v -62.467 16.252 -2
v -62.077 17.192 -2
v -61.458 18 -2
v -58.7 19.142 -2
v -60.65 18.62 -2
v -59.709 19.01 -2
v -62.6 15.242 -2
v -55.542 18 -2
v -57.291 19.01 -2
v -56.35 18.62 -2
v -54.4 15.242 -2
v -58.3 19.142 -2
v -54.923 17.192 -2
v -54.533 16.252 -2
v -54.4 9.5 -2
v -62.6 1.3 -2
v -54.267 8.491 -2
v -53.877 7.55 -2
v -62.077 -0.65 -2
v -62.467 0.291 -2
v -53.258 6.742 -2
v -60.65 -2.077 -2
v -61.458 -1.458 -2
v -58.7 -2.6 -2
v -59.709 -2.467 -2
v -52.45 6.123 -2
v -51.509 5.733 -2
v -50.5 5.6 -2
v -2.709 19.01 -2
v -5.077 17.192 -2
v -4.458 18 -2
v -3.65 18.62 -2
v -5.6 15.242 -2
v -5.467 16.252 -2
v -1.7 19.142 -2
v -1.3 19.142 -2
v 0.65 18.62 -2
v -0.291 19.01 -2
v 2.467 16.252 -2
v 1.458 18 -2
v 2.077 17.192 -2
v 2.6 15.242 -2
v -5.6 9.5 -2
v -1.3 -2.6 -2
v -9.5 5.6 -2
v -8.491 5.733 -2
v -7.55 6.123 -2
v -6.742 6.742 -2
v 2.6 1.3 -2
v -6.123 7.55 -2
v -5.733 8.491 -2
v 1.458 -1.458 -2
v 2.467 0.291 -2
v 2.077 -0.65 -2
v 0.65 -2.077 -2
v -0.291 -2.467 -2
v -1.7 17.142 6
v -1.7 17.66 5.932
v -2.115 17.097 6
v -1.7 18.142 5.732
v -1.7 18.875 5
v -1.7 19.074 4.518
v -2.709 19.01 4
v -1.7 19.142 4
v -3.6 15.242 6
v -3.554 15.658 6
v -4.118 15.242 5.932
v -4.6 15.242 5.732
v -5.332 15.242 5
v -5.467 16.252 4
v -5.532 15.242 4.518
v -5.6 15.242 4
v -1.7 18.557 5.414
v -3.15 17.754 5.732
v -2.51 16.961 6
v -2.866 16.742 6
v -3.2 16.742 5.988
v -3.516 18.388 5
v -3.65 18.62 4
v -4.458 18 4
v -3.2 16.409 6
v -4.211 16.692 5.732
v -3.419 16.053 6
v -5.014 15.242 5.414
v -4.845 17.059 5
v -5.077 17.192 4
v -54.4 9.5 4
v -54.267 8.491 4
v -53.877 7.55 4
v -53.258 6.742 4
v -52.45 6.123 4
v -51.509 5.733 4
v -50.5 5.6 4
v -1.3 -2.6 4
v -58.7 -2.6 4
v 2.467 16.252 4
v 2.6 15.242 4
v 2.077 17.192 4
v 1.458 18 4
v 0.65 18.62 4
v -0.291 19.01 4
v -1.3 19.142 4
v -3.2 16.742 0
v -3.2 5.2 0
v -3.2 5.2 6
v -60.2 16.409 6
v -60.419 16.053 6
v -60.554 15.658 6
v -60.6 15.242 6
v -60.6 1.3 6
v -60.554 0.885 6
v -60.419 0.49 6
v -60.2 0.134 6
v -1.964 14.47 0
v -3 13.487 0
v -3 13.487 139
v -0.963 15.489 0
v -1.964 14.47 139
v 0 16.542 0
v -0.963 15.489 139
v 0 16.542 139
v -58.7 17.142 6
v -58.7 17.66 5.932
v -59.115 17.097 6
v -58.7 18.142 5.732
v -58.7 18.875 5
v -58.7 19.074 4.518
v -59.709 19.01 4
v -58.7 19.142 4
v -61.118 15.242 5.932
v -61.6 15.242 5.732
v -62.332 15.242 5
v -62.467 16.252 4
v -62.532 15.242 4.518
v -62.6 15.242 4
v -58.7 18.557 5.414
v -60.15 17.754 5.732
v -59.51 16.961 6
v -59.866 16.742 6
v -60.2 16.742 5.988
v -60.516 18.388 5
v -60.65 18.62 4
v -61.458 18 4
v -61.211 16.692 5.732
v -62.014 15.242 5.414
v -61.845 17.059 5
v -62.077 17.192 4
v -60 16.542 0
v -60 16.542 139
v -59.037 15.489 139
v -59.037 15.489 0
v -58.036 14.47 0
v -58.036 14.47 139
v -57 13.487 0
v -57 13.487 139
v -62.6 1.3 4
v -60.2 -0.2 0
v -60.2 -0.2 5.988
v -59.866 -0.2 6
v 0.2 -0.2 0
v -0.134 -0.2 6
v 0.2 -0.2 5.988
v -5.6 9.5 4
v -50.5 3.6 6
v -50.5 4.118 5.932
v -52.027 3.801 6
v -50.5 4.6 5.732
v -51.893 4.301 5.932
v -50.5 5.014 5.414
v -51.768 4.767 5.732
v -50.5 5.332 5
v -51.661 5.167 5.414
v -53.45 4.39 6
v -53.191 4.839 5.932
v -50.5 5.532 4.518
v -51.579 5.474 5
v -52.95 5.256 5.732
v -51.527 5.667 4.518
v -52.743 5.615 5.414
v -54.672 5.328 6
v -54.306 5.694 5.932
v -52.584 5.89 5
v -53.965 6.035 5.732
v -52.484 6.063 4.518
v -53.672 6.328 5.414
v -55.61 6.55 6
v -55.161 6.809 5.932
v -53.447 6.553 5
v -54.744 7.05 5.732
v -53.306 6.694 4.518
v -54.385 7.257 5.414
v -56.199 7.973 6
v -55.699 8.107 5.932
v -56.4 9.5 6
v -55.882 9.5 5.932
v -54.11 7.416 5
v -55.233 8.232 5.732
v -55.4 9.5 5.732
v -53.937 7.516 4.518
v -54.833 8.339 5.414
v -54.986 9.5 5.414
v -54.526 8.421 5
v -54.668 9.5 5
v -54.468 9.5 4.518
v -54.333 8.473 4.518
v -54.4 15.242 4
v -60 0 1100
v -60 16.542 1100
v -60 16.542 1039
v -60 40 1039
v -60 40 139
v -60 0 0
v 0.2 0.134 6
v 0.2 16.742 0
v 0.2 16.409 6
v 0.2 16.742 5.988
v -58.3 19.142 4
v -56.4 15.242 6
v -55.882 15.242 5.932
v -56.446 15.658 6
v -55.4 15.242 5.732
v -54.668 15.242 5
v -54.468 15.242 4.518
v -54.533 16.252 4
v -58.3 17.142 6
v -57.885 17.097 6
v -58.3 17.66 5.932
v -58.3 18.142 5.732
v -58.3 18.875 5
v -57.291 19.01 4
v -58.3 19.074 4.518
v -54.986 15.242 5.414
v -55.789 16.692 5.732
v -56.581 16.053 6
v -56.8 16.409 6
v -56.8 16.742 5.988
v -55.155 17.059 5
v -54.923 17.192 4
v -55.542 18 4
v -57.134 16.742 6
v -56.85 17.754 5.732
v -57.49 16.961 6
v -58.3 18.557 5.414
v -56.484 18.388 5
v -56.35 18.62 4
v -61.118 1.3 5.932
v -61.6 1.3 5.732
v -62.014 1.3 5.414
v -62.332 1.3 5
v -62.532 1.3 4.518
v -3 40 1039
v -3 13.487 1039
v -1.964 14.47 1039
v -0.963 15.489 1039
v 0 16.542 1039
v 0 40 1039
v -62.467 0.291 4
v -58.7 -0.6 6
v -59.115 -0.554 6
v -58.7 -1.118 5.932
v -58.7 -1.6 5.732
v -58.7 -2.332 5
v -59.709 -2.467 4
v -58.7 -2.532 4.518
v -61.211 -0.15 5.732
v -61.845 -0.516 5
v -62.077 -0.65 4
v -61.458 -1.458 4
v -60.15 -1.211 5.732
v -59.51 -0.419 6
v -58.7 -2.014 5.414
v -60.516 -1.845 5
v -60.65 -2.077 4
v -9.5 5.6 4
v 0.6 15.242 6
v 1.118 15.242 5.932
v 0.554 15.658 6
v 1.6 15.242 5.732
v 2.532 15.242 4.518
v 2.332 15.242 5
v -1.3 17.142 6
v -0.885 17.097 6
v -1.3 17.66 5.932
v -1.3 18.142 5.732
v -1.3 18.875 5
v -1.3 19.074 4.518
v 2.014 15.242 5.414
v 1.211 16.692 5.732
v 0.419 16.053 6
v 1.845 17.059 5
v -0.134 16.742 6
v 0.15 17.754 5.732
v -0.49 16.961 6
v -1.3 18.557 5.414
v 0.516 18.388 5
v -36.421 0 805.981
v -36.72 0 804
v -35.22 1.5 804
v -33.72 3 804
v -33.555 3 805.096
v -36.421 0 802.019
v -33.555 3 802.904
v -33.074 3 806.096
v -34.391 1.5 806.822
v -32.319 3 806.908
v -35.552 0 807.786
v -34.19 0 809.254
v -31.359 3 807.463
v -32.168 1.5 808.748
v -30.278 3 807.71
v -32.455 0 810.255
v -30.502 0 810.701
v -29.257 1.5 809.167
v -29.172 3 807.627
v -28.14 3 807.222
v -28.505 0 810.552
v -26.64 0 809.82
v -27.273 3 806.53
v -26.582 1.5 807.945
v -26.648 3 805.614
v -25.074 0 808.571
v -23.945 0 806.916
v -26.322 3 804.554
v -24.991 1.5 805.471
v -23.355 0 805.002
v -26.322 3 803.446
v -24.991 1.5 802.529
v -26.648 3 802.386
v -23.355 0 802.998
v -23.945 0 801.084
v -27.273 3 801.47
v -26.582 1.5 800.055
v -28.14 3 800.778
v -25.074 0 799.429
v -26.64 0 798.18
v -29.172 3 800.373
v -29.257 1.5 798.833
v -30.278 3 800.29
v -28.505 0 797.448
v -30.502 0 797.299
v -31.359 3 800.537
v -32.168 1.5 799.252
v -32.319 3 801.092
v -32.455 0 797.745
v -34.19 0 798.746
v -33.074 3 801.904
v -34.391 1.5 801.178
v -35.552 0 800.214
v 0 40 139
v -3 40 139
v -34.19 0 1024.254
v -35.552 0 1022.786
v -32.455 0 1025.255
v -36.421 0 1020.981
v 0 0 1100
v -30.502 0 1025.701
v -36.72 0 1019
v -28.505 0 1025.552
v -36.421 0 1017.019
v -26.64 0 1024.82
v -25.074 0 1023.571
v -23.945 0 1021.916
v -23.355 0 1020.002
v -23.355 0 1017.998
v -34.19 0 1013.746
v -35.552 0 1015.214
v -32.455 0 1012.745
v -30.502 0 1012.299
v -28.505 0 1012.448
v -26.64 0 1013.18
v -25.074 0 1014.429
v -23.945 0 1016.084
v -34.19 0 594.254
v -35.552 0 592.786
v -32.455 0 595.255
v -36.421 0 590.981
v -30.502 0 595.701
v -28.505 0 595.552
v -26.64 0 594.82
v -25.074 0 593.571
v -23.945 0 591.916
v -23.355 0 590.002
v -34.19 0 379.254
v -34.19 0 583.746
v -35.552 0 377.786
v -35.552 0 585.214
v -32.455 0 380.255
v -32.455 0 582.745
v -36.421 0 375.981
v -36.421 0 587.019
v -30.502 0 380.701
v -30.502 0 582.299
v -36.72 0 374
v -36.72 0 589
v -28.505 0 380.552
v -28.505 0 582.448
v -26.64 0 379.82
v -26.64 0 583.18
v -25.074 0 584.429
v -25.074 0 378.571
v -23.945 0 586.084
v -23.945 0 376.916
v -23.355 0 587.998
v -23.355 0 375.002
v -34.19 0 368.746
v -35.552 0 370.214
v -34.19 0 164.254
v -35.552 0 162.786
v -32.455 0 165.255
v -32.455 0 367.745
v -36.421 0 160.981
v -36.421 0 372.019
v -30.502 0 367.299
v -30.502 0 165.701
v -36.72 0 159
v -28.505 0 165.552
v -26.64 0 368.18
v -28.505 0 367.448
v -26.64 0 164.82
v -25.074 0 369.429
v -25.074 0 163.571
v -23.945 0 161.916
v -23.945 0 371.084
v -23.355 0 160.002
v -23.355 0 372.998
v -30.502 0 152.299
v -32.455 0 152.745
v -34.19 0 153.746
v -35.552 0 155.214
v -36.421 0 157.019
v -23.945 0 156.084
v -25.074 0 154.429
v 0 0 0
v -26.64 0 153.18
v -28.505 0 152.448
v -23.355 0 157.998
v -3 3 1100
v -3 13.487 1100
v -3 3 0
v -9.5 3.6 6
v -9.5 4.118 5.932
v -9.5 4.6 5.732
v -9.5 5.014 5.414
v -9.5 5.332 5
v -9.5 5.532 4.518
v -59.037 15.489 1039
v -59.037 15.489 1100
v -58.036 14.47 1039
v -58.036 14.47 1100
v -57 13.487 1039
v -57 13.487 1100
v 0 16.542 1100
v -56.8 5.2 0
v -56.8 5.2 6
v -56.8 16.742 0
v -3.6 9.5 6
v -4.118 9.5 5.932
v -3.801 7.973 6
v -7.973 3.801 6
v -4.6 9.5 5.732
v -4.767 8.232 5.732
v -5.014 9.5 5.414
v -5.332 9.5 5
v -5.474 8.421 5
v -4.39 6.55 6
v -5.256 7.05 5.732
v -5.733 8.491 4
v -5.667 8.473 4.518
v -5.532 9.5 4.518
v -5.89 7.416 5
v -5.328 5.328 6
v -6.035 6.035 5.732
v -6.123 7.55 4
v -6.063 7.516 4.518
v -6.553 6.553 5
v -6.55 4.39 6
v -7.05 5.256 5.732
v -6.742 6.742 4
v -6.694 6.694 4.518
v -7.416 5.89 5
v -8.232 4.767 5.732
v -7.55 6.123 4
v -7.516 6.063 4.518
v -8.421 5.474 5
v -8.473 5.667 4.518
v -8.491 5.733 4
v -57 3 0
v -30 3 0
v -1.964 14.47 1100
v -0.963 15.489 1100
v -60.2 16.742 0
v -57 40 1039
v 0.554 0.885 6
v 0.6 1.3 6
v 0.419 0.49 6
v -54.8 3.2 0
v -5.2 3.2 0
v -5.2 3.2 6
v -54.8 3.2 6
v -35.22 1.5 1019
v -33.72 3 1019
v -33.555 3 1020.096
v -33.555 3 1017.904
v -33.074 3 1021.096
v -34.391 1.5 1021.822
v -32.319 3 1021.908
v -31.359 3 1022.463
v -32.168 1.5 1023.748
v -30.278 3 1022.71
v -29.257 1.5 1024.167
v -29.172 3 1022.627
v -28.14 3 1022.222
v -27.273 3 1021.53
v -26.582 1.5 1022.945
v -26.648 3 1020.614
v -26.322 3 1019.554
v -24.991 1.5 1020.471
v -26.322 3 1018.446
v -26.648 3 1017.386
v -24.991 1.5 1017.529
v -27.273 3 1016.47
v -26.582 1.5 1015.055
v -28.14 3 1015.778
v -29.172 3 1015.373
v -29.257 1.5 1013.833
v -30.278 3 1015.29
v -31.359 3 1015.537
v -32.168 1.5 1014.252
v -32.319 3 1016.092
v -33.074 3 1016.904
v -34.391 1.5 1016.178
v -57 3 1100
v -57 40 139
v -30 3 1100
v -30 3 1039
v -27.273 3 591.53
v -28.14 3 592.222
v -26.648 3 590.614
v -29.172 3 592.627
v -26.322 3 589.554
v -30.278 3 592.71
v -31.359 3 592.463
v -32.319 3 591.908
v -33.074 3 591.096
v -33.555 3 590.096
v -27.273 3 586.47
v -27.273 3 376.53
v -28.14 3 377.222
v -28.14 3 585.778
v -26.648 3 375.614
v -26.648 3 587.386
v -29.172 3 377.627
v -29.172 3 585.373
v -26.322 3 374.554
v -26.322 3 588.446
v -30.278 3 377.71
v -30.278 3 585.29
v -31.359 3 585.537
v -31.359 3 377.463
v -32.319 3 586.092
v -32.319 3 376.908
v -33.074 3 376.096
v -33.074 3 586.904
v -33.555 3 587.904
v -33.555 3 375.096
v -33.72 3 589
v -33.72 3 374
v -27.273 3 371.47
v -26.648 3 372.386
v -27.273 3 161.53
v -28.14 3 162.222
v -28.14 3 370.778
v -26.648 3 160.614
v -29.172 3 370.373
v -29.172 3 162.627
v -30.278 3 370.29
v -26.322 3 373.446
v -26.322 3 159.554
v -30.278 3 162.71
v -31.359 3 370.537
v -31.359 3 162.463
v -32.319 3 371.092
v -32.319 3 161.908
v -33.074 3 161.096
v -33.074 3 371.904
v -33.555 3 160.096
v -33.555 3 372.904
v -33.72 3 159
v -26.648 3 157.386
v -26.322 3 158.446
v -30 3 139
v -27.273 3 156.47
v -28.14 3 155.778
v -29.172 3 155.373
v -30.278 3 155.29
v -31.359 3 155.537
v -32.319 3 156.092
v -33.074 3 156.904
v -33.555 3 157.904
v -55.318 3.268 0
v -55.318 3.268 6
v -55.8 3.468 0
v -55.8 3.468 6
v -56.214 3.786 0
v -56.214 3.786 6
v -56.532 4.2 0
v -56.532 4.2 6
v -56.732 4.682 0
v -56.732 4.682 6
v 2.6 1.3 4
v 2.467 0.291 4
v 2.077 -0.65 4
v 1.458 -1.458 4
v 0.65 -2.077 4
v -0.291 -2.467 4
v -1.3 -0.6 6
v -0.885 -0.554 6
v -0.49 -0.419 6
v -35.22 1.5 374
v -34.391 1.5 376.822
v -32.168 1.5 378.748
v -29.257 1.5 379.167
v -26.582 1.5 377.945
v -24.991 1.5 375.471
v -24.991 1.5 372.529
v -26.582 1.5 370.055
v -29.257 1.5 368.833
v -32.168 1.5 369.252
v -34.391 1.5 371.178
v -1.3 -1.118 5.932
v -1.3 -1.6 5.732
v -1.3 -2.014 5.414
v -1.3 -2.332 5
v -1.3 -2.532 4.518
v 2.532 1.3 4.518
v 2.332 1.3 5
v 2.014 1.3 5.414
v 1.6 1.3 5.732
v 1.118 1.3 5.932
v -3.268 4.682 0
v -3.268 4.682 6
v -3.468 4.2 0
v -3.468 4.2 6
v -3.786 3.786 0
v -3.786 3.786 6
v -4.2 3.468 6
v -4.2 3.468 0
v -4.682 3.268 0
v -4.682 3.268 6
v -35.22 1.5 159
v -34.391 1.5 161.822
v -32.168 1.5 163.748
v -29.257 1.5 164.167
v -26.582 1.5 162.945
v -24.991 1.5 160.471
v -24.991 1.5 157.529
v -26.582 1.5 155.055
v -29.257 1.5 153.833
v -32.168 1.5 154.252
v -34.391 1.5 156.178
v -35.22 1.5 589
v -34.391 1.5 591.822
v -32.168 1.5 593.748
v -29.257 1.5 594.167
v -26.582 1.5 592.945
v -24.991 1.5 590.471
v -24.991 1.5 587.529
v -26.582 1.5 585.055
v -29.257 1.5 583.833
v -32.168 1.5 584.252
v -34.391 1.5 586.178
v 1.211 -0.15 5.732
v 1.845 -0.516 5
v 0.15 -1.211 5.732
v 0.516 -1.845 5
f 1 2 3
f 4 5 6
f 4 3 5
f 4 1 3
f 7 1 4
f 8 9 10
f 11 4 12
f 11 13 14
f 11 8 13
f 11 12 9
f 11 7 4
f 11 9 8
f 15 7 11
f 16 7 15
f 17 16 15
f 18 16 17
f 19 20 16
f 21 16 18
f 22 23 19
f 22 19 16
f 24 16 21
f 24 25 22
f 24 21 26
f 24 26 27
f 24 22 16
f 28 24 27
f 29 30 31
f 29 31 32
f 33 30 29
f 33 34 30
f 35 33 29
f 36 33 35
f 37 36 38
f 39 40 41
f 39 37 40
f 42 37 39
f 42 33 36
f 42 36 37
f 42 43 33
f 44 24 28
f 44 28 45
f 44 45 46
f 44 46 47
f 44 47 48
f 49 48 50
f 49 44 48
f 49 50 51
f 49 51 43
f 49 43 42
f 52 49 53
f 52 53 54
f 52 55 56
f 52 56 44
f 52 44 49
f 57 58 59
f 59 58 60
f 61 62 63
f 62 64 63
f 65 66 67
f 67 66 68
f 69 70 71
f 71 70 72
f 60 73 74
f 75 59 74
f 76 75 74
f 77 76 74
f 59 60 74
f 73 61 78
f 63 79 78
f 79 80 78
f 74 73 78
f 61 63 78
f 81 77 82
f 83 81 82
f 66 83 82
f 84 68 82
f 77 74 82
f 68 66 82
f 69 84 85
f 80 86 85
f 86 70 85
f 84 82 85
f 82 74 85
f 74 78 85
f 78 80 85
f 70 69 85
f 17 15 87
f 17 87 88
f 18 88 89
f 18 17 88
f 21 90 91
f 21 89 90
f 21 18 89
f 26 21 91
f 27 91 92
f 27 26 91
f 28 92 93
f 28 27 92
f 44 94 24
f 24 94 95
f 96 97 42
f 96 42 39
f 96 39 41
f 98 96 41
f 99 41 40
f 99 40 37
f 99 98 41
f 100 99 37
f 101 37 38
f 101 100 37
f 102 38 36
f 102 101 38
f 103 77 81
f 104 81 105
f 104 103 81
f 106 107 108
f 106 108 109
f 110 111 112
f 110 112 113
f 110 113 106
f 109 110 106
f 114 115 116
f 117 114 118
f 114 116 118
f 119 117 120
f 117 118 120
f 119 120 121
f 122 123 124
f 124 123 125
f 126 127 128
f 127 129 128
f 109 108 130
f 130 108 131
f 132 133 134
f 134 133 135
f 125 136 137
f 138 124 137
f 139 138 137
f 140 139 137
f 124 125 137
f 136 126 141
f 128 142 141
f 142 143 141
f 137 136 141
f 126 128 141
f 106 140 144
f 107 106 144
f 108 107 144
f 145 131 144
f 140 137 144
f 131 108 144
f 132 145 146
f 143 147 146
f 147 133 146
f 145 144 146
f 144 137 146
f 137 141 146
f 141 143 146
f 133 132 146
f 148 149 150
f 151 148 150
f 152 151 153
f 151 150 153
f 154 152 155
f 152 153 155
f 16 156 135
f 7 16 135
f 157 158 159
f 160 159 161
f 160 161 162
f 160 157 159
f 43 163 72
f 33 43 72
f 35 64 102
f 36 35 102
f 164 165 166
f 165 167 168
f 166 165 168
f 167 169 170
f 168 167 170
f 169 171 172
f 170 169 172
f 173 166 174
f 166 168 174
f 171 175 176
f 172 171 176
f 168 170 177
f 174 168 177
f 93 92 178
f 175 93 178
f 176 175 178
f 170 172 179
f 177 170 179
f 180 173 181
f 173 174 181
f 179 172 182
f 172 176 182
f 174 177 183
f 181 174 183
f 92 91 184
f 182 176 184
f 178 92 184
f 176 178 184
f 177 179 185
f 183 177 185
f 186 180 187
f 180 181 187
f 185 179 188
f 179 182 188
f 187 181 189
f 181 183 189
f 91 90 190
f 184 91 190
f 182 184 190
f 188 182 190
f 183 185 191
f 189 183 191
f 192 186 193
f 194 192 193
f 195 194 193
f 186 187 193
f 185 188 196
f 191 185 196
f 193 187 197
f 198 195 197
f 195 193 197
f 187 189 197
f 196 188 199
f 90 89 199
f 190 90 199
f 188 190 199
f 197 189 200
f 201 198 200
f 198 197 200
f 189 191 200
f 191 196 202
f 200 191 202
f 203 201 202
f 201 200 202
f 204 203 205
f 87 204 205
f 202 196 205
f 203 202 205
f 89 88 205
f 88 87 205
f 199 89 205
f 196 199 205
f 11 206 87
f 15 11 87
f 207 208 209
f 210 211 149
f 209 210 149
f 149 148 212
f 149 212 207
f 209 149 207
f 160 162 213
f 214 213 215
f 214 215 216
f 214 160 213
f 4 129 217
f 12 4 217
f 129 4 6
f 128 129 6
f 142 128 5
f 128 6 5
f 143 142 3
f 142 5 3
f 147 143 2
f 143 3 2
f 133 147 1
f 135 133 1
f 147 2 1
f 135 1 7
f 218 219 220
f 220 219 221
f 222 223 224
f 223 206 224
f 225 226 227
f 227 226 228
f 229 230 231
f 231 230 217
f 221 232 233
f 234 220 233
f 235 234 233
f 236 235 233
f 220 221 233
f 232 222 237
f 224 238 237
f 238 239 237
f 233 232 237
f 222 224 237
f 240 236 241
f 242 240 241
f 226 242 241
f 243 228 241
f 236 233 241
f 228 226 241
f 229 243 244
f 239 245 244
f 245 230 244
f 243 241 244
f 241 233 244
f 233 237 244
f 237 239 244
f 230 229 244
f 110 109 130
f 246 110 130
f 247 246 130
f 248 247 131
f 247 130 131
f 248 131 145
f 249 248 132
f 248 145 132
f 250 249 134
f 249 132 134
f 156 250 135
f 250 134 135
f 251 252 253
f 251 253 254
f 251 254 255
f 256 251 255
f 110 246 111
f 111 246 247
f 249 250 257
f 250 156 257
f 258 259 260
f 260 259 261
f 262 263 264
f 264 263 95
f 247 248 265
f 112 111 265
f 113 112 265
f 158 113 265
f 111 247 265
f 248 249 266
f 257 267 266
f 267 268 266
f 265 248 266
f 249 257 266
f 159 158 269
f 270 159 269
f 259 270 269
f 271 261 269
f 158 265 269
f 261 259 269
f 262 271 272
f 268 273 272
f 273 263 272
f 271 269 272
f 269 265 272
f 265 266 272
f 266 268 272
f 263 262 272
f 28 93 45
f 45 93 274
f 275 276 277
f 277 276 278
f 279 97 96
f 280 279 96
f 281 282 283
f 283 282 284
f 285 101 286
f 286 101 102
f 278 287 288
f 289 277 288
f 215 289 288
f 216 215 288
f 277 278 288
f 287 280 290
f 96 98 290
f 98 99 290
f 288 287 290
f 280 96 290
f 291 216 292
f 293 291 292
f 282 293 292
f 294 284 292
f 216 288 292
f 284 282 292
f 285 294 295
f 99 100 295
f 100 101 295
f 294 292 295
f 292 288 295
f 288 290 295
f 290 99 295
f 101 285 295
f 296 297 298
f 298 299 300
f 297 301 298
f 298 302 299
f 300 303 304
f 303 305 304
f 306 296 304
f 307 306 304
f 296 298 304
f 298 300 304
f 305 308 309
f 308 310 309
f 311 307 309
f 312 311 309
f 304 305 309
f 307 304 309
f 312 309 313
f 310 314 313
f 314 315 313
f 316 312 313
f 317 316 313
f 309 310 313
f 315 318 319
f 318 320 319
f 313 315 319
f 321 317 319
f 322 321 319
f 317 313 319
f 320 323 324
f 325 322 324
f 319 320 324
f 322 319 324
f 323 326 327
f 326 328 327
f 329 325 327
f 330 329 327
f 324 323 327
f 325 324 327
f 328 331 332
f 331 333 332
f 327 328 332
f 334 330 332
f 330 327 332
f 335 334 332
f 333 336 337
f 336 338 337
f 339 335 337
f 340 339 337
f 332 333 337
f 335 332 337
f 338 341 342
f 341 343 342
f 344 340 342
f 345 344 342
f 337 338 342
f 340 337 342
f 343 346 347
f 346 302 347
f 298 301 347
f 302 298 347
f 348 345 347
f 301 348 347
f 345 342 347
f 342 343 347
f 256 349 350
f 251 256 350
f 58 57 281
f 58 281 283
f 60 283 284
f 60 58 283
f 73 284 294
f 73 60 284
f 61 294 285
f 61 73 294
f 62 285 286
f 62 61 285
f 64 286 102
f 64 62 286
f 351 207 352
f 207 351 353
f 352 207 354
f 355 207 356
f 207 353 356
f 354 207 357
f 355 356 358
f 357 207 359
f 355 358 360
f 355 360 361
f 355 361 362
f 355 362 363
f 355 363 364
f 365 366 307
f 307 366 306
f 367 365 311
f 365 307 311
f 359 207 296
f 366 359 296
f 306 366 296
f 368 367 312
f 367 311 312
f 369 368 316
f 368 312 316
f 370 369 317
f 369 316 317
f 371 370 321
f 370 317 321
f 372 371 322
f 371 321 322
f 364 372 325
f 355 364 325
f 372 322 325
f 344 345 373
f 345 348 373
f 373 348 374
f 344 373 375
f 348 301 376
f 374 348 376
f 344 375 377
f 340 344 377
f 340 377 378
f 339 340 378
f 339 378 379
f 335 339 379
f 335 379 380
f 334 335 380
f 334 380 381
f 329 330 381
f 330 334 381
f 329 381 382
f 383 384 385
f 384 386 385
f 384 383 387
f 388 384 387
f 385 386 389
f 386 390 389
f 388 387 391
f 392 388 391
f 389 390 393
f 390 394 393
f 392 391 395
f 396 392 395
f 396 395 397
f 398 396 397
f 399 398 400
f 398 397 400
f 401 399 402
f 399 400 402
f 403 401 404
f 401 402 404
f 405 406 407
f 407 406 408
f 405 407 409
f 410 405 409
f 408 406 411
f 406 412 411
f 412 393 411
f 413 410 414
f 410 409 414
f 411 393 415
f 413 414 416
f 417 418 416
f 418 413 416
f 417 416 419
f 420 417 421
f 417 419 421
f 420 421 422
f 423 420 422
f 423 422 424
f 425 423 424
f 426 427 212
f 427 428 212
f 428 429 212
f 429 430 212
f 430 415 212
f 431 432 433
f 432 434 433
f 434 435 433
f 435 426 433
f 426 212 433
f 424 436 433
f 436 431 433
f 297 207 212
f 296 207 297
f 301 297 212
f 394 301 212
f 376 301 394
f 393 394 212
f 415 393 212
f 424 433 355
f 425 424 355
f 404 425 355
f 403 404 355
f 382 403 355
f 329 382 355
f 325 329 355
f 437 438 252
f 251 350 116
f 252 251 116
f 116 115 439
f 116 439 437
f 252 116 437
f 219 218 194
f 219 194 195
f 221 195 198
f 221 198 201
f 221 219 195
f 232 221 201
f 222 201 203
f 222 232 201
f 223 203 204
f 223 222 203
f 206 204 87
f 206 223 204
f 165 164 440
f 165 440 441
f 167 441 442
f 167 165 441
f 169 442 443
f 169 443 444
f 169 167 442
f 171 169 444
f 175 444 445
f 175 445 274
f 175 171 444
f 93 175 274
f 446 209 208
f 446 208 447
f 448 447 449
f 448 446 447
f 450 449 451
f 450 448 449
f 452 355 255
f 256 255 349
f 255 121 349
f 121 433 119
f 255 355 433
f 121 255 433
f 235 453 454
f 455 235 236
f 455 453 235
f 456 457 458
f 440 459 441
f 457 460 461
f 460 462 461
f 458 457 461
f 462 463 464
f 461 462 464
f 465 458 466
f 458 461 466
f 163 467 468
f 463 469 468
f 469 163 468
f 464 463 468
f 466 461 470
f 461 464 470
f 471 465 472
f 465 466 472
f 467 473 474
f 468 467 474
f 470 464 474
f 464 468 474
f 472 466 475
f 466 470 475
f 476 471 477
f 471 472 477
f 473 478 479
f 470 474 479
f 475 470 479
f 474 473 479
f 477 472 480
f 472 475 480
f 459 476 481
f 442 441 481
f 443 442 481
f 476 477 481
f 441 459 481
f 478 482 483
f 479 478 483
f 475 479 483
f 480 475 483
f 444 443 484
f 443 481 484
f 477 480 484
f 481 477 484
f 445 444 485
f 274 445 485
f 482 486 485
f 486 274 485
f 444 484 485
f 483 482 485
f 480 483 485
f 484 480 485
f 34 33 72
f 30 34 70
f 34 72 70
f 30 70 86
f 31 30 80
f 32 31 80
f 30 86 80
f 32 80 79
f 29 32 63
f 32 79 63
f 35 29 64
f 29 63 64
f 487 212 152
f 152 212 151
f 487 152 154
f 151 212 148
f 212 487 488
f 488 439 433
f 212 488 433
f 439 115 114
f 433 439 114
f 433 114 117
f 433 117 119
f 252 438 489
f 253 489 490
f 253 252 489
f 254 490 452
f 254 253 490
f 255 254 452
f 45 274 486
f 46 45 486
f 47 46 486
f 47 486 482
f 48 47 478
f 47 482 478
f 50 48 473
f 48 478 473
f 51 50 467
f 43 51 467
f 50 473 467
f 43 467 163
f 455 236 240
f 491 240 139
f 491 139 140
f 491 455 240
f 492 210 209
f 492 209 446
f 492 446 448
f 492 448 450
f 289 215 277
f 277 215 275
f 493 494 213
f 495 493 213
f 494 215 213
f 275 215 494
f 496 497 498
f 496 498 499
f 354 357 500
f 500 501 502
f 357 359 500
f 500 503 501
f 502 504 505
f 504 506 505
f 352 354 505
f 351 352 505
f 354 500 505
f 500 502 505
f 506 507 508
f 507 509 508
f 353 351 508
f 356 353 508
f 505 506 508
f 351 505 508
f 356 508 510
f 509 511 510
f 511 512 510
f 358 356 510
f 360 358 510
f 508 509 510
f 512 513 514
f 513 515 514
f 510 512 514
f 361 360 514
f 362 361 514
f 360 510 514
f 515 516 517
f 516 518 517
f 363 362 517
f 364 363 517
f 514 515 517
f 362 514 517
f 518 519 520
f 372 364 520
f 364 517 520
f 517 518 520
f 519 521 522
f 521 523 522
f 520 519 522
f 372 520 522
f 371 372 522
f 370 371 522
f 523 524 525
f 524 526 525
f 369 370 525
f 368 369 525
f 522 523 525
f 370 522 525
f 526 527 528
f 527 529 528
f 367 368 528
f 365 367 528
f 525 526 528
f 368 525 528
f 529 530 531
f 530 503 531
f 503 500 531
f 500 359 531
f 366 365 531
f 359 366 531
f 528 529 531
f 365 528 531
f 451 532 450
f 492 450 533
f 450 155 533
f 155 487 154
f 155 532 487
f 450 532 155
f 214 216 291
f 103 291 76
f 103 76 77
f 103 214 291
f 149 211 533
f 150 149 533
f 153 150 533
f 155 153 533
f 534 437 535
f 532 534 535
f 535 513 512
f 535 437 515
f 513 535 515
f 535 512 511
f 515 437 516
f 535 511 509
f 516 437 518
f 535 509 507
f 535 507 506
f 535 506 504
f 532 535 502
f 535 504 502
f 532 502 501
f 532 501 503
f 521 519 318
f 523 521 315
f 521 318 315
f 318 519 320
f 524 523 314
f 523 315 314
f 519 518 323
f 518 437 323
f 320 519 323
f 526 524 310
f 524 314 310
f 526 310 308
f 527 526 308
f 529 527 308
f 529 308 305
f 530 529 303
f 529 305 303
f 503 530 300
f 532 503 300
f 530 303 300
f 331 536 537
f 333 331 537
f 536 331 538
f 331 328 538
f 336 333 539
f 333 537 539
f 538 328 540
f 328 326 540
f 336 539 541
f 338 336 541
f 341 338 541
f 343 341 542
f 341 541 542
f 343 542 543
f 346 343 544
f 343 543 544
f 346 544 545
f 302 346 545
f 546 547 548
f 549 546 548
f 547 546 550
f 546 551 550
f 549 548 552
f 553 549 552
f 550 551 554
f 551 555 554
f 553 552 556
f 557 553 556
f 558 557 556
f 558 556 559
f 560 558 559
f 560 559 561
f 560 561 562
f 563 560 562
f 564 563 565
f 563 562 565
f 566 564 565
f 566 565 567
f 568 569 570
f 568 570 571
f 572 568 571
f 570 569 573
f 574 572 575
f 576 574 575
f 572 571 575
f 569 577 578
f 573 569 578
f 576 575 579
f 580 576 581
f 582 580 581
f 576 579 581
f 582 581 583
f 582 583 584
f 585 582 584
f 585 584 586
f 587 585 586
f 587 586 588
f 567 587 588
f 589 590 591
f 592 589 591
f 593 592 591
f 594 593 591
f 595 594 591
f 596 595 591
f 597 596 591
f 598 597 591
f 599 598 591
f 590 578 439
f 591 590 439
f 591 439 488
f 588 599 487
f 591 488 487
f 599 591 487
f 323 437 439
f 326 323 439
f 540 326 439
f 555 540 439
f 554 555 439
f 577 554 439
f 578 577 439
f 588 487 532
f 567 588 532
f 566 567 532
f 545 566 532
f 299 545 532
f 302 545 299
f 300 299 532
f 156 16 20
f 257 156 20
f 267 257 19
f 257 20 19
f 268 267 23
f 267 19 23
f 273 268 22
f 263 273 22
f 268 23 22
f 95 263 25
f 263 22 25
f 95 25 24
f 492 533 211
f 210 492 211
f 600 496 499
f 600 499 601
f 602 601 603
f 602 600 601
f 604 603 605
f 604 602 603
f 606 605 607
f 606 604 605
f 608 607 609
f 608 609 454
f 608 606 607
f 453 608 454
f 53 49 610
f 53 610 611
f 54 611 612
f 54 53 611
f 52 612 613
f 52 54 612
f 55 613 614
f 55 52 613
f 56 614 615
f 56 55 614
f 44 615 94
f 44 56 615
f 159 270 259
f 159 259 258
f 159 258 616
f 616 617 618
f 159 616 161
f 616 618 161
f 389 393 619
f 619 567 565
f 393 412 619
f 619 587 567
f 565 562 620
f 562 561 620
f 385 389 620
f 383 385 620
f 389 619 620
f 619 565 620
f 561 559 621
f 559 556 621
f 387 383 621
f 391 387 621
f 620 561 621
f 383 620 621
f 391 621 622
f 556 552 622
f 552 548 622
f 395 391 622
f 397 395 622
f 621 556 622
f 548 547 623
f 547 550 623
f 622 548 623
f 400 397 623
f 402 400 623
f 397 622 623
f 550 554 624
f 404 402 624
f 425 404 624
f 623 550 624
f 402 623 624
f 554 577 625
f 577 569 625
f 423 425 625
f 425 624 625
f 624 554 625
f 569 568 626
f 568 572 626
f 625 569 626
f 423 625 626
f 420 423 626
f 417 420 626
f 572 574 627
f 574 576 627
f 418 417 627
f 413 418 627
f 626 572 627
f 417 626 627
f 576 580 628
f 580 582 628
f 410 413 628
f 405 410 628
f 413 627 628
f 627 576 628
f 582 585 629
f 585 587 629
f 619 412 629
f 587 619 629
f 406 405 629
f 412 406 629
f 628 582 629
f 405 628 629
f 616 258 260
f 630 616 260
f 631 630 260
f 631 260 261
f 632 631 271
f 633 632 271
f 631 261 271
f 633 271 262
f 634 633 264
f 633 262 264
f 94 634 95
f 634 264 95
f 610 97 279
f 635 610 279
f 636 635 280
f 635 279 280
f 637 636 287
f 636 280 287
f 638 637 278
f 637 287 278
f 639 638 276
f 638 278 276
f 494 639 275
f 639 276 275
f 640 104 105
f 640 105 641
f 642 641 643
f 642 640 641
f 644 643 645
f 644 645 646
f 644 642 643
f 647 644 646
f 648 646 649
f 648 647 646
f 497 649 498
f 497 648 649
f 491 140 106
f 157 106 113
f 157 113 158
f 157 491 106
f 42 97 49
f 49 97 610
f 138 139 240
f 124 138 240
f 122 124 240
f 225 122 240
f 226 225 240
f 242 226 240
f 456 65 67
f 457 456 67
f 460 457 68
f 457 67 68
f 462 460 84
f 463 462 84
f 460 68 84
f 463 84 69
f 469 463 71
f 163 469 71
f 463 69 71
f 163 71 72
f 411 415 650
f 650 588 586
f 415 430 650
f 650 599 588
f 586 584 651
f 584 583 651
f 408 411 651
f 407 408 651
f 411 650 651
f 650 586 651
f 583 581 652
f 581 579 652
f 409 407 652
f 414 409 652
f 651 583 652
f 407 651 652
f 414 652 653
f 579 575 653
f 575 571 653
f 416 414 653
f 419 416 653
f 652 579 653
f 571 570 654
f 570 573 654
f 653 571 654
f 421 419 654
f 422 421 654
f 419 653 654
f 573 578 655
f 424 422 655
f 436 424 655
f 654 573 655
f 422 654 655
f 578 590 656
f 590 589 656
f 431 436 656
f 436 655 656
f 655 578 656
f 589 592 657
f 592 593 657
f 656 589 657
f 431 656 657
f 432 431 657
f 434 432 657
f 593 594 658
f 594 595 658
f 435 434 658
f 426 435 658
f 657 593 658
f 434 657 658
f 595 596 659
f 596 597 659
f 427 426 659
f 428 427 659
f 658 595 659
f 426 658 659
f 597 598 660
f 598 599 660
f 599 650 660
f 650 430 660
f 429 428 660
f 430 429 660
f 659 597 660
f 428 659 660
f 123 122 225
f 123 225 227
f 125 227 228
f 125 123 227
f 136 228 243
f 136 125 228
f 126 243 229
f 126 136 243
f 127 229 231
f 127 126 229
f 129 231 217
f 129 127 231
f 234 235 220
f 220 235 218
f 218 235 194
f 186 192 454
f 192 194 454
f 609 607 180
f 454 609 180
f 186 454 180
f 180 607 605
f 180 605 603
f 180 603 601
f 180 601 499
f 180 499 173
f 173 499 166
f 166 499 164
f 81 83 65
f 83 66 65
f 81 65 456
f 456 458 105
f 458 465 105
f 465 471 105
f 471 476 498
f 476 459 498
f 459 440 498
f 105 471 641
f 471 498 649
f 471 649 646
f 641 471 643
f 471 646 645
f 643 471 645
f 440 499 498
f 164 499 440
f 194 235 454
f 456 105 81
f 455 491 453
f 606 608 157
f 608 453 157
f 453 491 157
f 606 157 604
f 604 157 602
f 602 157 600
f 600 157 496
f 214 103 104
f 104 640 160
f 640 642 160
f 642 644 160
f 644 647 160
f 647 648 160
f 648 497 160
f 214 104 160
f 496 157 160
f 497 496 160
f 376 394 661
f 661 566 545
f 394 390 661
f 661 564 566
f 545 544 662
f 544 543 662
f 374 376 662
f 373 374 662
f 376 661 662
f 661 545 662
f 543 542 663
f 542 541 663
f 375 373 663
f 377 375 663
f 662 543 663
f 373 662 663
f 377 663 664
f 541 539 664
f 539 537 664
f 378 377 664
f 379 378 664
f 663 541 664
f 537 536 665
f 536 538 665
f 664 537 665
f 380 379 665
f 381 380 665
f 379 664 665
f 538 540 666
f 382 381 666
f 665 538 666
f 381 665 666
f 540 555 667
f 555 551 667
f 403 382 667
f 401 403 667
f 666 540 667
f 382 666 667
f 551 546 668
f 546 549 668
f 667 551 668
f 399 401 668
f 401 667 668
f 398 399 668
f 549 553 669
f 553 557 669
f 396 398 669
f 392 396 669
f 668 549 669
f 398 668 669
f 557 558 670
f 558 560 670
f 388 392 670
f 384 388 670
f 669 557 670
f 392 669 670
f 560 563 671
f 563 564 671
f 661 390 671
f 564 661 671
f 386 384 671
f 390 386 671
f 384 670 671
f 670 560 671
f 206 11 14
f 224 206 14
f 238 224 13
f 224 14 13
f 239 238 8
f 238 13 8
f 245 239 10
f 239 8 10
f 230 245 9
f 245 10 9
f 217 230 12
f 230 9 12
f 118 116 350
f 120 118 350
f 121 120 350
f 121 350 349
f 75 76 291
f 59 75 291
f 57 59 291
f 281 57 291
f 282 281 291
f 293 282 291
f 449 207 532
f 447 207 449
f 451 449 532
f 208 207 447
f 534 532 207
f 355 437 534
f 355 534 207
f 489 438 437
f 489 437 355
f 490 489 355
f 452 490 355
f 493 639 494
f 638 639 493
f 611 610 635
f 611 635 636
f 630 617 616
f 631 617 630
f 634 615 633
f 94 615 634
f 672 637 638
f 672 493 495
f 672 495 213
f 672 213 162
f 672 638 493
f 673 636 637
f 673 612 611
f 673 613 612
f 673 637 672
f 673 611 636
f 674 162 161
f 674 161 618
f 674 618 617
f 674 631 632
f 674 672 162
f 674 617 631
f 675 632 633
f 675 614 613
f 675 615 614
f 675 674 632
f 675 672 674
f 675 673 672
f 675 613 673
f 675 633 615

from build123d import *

# Parameters (mm, degrees)
F1_DEPTH        = 1100
F7_R            = 40
F8_DEPTH        = 139
F10_R           = 40
F11_DEPTH       = 61
F13_D           = 6.6
F13_CSINK_D     = 13.44
F13_CSINK_ANGLE = 90
F15_DEPTH       = 6
F16_DEPTH       = 2
F17_R           = 3.9
F18_T1_DEPTH    = 13.9424868894
F18_T3_DEPTH    = 11
F18_T5_DEPTH    = 0.4
F18_T7_DEPTH    = 57.4
F18_T9_DEPTH    = 5.7424868894
F18_T11_DEPTH   = 41
F18_T13_DEPTH   = 0.4
F18_T16_ANGLE   = 90
F18_T18_ANGLE   = 90
F18_T20_ANGLE   = 90
F18_T22_ANGLE   = 90
F18_T24_ANGLE   = 90
F18_T26_ANGLE   = 90
F18_T28_ANGLE   = 90
F18_T30_ANGLE   = 90


# Not quite as in the source:
# - a fillet or chamfer that OpenCascade refuses, or shapes differently, is made with other operations: its cross-section is extruded or revolved along the edge and cut away or added


with BuildPart() as f1:
    # F0 (on Top) → F1 (new body)
    with BuildSketch(Plane.XY):
        Polygon((-60, 0), (0, 0), (0, 40), (-3, 40), (-3, 3), (-57, 3), (-57, 40), (-60, 40), align=None)
    extrude(amount=F1_DEPTH)

    # F7 (on offset) → F8 (cut, through all)
    with BuildSketch(Plane.XY.offset(139)):
        with Locations((-30, 43)):
            Circle(F7_R)
    extrude(amount=-F8_DEPTH, mode=Mode.SUBTRACT)

    # F10 (on offset) → F11 (cut, through all)
    with BuildSketch(Plane.XY.offset(1039)):
        with Locations((-30, 43)):
            Circle(F10_R)
    extrude(amount=F11_DEPTH, mode=Mode.SUBTRACT)

    # F13 (through all)
    with Locations(Plane.XZ):
        with Locations((-30, 159), (-30, 374), (-30, 589), (-30, 804), (-30, 1019)):
            CounterSinkHole(F13_D / 2, F13_CSINK_D / 2, counter_sink_angle=F13_CSINK_ANGLE)


with BuildPart() as f15:
    # F14 (on face) → F15 (new body)
    with BuildSketch(Plane(origin=(0, 0, 0), x_dir=(1, 0, 0), z_dir=(0, 0, -1))):
        Polygon((2.6, -19.1424868894), (2.6, 2.6), (-62.6, 2.6), (-62.6, -19.1424868894), (-54.4, -19.1424868894), (-54.4, -5.6), (-5.6, -5.6), (-5.6, -19.1424868894), align=None)
        Polygon((-60.2, 0.2), (0.2, 0.2), (0.2, -16.7424868894), (-3.2, -16.7424868894), (-3.2, -3.2), (-56.8, -3.2), (-56.8, -16.7424868894), (-60.2, -16.7424868894), align=None, mode=Mode.SUBTRACT)
    extrude(amount=-F15_DEPTH)

    # F14 (on face) → F16 (join)
    with BuildSketch(Plane(origin=(0, 0, 0), x_dir=(1, 0, 0), z_dir=(0, 0, -1))):
        Polygon((2.6, -19.1424868894), (2.6, 2.6), (-62.6, 2.6), (-62.6, -19.1424868894), (-54.4, -19.1424868894), (-54.4, -5.6), (-5.6, -5.6), (-5.6, -19.1424868894), align=None)
        Polygon((-60.2, 0.2), (0.2, 0.2), (0.2, -16.7424868894), (-3.2, -16.7424868894), (-3.2, -3.2), (-56.8, -3.2), (-56.8, -16.7424868894), (-60.2, -16.7424868894), align=None, mode=Mode.SUBTRACT)
        Polygon((0.2, -16.7424868894), (0.2, 0.2), (-60.2, 0.2), (-60.2, -16.7424868894), (-56.8, -16.7424868894), (-56.8, -3.2), (-3.2, -3.2), (-3.2, -16.7424868894), align=None)
        with BuildLine():
            Line((-60, -16.5424868894), (-60, 0))
            Line((-60, 0), (0, 0))
            Line((0, 0), (0, -16.5424868894))
            ThreePointArc((0, -16.5424868894), (-1.459089789, -14.9747177655), (-3, -13.4872908733))
            Line((-3, -13.4872908733), (-3, -3))
            Line((-3, -3), (-30, -3))
            Line((-30, -3), (-57, -3))
            Line((-57, -3), (-57, -13.4872908733))
            ThreePointArc((-57, -13.4872908733), (-58.540910211, -14.9747177655), (-60, -16.5424868894))
        make_face(mode=Mode.SUBTRACT)
        with BuildLine():
            Line((0, 0), (-60, 0))
            Line((-60, 0), (-60, -16.5424868894))
            ThreePointArc((-60, -16.5424868894), (-58.540910211, -14.9747177655), (-57, -13.4872908733))
            Line((-57, -13.4872908733), (-57, -3))
            Line((-57, -3), (-30, -3))
            Line((-30, -3), (-3, -3))
            Line((-3, -3), (-3, -13.4872908733))
            ThreePointArc((-3, -13.4872908733), (-1.459089789, -14.9747177655), (0, -16.5424868894))
            Line((0, -16.5424868894), (0, 0))
        make_face()
    extrude(amount=F16_DEPTH)

    # F17
    f17_edges = [f15.edges().sort_by_distance(p)[0] for p in [
        (2.6, 19.142487, 2),
        (-5.6, 19.142487, 2),
        (-5.6, 5.6, 2),
        (-54.4, 19.142487, 2),
        (-62.6, 19.142487, 2),
        (-54.4, 5.6, 2),
        (-62.6, -2.6, 2),
        (2.6, -2.6, 2),
    ]]
    fillet(f17_edges, radius=F17_R)

    # F18: fillet of radius 2 on 18 edges, made by hand

    # F18_s2 → F18_t1 (cut)
    with BuildSketch(Plane.XZ.offset(-15.2424868894)):
        with BuildLine():
            ThreePointArc((2.6, 4), (2.0142135624, 5.4142135624), (0.6, 6))
            Line((0.6, 6), (2.6, 6))
            Line((2.6, 6), (2.6, 4))
        make_face()
        with BuildLine():
            ThreePointArc((-60.6, 6), (-62.0142135624, 5.4142135624), (-62.6, 4))
            Line((-62.6, 4), (-62.6, 6))
            Line((-62.6, 6), (-60.6, 6))
        make_face()
    extrude(amount=F18_T1_DEPTH, mode=Mode.SUBTRACT)

    # F18_s4 → F18_t3 (cut)
    with BuildSketch(Plane.XY):
        with BuildLine():
            ThreePointArc((-3.2, 5.2), (-3.7857864376, 3.7857864376), (-5.2, 3.2))
            Line((-5.2, 3.2), (-3.2, 3.2))
            Line((-3.2, 3.2), (-3.2, 5.2))
        make_face()
        with BuildLine():
            ThreePointArc((-54.8, 3.2), (-56.2142135624, 3.7857864376), (-56.8, 5.2))
            Line((-56.8, 5.2), (-56.8, 3.2))
            Line((-56.8, 3.2), (-54.8, 3.2))
        make_face()
    extrude(amount=F18_T3_DEPTH, mode=Mode.SUBTRACT)

    # F18_s6 → F18_t5 (cut)
    with BuildSketch(Plane.YZ.offset(-1.7)):
        with BuildLine():
            ThreePointArc((17.1424868894, 6), (18.5567004517, 5.4142135624), (19.1424868894, 4))
            Line((19.1424868894, 4), (19.1424868894, 6))
            Line((19.1424868894, 6), (17.1424868894, 6))
        make_face()
    extrude(amount=F18_T5_DEPTH, mode=Mode.SUBTRACT)

    # F18_s8 → F18_t7 (cut)
    with BuildSketch(Plane.YZ.offset(-58.7)):
        with BuildLine():
            ThreePointArc((-0.6, 6), (-2.0142135624, 5.4142135624), (-2.6, 4))
            Line((-2.6, 4), (-2.6, 6))
            Line((-2.6, 6), (-0.6, 6))
        make_face()
    extrude(amount=F18_T7_DEPTH, mode=Mode.SUBTRACT)

    # F18_s10 → F18_t9 (cut)
    with BuildSketch(Plane.XZ.offset(-15.2424868894)):
        with BuildLine():
            ThreePointArc((-3.6, 6), (-5.0142135624, 5.4142135624), (-5.6, 4))
            Line((-5.6, 4), (-5.6, 6))
            Line((-5.6, 6), (-3.6, 6))
        make_face()
        with BuildLine():
            ThreePointArc((-56.4, 6), (-54.9857864376, 5.4142135624), (-54.4, 4))
            Line((-54.4, 4), (-54.4, 6))
            Line((-54.4, 6), (-56.4, 6))
        make_face()
    extrude(amount=F18_T9_DEPTH, mode=Mode.SUBTRACT)

    # F18_s12 → F18_t11 (cut)
    with BuildSketch(Plane.YZ.offset(-50.5)):
        with BuildLine():
            ThreePointArc((3.6, 6), (5.0142135624, 5.4142135624), (5.6, 4))
            Line((5.6, 4), (5.6, 6))
            Line((5.6, 6), (3.6, 6))
        make_face()
    extrude(amount=F18_T11_DEPTH, mode=Mode.SUBTRACT)

    # F18_s14 → F18_t13 (cut)
    with BuildSketch(Plane.YZ.offset(-58.7)):
        with BuildLine():
            ThreePointArc((17.1424868894, 6), (18.5567004517, 5.4142135624), (19.1424868894, 4))
            Line((19.1424868894, 4), (19.1424868894, 6))
            Line((19.1424868894, 6), (17.1424868894, 6))
        make_face()
    extrude(amount=F18_T13_DEPTH, mode=Mode.SUBTRACT)

    # F18_s15 → F18_t16 (revolve, cut)
    with BuildSketch(Plane.XZ.offset(-15.2424868894)):
        with BuildLine():
            ThreePointArc((0.6, 6), (2.0142135624, 5.4142135624), (2.6, 4))
            Line((2.6, 4), (2.6, 6))
            Line((2.6, 6), (0.6, 6))
        make_face()
    revolve(axis=Axis((-1.3, 15.2424868894, 6), (0, 0, 1)), revolution_arc=F18_T16_ANGLE, mode=Mode.SUBTRACT)

    # F18_s17 → F18_t18 (revolve, cut)
    with BuildSketch(Plane.XZ.offset(-1.3)):
        with BuildLine():
            ThreePointArc((0.6, 6), (2.0142135624, 5.4142135624), (2.6, 4))
            Line((2.6, 4), (2.6, 6))
            Line((2.6, 6), (0.6, 6))
        make_face()
    revolve(axis=Axis((-1.3, 1.3, 6), (0, 0, -1)), revolution_arc=F18_T18_ANGLE, mode=Mode.SUBTRACT)

    # F18_s19 → F18_t20 (revolve, cut)
    with BuildSketch(Plane.YZ.offset(-1.7)):
        with BuildLine():
            ThreePointArc((17.1424868894, 6), (18.5567004517, 5.4142135624), (19.1424868894, 4))
            Line((19.1424868894, 4), (19.1424868894, 6))
            Line((19.1424868894, 6), (17.1424868894, 6))
        make_face()
    revolve(axis=Axis((-1.7, 15.2424868894, 6), (0, 0, 1)), revolution_arc=F18_T20_ANGLE, mode=Mode.SUBTRACT)

    # F18_s21 → F18_t22 (revolve, cut)
    with BuildSketch(Plane.XZ.offset(-1.3)):
        with BuildLine():
            ThreePointArc((-60.6, 6), (-62.0142135624, 5.4142135624), (-62.6, 4))
            Line((-62.6, 4), (-62.6, 6))
            Line((-62.6, 6), (-60.6, 6))
        make_face()
    revolve(axis=Axis((-58.7, 1.3, 6), (0, 0, 1)), revolution_arc=F18_T22_ANGLE, mode=Mode.SUBTRACT)

    # F18_s23 → F18_t24 (revolve, cut)
    with BuildSketch(Plane.XZ.offset(-9.5)):
        with BuildLine():
            ThreePointArc((-3.6, 6), (-5.0142135624, 5.4142135624), (-5.6, 4))
            Line((-5.6, 4), (-5.6, 6))
            Line((-5.6, 6), (-3.6, 6))
        make_face()
    revolve(axis=Axis((-9.5, 9.5, 6), (0, 0, -1)), revolution_arc=F18_T24_ANGLE, mode=Mode.SUBTRACT)

    # F18_s25 → F18_t26 (revolve, cut)
    with BuildSketch(Plane.YZ.offset(-58.7)):
        with BuildLine():
            ThreePointArc((17.1424868894, 6), (18.5567004517, 5.4142135624), (19.1424868894, 4))
            Line((19.1424868894, 4), (19.1424868894, 6))
            Line((19.1424868894, 6), (17.1424868894, 6))
        make_face()
    revolve(axis=Axis((-58.7, 15.2424868894, 6), (0, 0, 1)), revolution_arc=F18_T26_ANGLE, mode=Mode.SUBTRACT)

    # F18_s27 → F18_t28 (revolve, cut)
    with BuildSketch(Plane.YZ.offset(-50.5)):
        with BuildLine():
            ThreePointArc((3.6, 6), (5.0142135624, 5.4142135624), (5.6, 4))
            Line((5.6, 4), (5.6, 6))
            Line((5.6, 6), (3.6, 6))
        make_face()
    revolve(axis=Axis((-50.5, 9.5, 6), (0, 0, -1)), revolution_arc=F18_T28_ANGLE, mode=Mode.SUBTRACT)

    # F18_s29 → F18_t30 (revolve, cut)
    with BuildSketch(Plane.XZ.offset(-15.2424868894)):
        with BuildLine():
            ThreePointArc((-56.4, 6), (-54.9857864376, 5.4142135624), (-54.4, 4))
            Line((-54.4, 4), (-54.4, 6))
            Line((-54.4, 6), (-56.4, 6))
        make_face()
    revolve(axis=Axis((-58.3, 15.2424868894, 6), (0, 0, 1)), revolution_arc=F18_T30_ANGLE, mode=Mode.SUBTRACT)


solid = Compound([f1.part, f15.part])
